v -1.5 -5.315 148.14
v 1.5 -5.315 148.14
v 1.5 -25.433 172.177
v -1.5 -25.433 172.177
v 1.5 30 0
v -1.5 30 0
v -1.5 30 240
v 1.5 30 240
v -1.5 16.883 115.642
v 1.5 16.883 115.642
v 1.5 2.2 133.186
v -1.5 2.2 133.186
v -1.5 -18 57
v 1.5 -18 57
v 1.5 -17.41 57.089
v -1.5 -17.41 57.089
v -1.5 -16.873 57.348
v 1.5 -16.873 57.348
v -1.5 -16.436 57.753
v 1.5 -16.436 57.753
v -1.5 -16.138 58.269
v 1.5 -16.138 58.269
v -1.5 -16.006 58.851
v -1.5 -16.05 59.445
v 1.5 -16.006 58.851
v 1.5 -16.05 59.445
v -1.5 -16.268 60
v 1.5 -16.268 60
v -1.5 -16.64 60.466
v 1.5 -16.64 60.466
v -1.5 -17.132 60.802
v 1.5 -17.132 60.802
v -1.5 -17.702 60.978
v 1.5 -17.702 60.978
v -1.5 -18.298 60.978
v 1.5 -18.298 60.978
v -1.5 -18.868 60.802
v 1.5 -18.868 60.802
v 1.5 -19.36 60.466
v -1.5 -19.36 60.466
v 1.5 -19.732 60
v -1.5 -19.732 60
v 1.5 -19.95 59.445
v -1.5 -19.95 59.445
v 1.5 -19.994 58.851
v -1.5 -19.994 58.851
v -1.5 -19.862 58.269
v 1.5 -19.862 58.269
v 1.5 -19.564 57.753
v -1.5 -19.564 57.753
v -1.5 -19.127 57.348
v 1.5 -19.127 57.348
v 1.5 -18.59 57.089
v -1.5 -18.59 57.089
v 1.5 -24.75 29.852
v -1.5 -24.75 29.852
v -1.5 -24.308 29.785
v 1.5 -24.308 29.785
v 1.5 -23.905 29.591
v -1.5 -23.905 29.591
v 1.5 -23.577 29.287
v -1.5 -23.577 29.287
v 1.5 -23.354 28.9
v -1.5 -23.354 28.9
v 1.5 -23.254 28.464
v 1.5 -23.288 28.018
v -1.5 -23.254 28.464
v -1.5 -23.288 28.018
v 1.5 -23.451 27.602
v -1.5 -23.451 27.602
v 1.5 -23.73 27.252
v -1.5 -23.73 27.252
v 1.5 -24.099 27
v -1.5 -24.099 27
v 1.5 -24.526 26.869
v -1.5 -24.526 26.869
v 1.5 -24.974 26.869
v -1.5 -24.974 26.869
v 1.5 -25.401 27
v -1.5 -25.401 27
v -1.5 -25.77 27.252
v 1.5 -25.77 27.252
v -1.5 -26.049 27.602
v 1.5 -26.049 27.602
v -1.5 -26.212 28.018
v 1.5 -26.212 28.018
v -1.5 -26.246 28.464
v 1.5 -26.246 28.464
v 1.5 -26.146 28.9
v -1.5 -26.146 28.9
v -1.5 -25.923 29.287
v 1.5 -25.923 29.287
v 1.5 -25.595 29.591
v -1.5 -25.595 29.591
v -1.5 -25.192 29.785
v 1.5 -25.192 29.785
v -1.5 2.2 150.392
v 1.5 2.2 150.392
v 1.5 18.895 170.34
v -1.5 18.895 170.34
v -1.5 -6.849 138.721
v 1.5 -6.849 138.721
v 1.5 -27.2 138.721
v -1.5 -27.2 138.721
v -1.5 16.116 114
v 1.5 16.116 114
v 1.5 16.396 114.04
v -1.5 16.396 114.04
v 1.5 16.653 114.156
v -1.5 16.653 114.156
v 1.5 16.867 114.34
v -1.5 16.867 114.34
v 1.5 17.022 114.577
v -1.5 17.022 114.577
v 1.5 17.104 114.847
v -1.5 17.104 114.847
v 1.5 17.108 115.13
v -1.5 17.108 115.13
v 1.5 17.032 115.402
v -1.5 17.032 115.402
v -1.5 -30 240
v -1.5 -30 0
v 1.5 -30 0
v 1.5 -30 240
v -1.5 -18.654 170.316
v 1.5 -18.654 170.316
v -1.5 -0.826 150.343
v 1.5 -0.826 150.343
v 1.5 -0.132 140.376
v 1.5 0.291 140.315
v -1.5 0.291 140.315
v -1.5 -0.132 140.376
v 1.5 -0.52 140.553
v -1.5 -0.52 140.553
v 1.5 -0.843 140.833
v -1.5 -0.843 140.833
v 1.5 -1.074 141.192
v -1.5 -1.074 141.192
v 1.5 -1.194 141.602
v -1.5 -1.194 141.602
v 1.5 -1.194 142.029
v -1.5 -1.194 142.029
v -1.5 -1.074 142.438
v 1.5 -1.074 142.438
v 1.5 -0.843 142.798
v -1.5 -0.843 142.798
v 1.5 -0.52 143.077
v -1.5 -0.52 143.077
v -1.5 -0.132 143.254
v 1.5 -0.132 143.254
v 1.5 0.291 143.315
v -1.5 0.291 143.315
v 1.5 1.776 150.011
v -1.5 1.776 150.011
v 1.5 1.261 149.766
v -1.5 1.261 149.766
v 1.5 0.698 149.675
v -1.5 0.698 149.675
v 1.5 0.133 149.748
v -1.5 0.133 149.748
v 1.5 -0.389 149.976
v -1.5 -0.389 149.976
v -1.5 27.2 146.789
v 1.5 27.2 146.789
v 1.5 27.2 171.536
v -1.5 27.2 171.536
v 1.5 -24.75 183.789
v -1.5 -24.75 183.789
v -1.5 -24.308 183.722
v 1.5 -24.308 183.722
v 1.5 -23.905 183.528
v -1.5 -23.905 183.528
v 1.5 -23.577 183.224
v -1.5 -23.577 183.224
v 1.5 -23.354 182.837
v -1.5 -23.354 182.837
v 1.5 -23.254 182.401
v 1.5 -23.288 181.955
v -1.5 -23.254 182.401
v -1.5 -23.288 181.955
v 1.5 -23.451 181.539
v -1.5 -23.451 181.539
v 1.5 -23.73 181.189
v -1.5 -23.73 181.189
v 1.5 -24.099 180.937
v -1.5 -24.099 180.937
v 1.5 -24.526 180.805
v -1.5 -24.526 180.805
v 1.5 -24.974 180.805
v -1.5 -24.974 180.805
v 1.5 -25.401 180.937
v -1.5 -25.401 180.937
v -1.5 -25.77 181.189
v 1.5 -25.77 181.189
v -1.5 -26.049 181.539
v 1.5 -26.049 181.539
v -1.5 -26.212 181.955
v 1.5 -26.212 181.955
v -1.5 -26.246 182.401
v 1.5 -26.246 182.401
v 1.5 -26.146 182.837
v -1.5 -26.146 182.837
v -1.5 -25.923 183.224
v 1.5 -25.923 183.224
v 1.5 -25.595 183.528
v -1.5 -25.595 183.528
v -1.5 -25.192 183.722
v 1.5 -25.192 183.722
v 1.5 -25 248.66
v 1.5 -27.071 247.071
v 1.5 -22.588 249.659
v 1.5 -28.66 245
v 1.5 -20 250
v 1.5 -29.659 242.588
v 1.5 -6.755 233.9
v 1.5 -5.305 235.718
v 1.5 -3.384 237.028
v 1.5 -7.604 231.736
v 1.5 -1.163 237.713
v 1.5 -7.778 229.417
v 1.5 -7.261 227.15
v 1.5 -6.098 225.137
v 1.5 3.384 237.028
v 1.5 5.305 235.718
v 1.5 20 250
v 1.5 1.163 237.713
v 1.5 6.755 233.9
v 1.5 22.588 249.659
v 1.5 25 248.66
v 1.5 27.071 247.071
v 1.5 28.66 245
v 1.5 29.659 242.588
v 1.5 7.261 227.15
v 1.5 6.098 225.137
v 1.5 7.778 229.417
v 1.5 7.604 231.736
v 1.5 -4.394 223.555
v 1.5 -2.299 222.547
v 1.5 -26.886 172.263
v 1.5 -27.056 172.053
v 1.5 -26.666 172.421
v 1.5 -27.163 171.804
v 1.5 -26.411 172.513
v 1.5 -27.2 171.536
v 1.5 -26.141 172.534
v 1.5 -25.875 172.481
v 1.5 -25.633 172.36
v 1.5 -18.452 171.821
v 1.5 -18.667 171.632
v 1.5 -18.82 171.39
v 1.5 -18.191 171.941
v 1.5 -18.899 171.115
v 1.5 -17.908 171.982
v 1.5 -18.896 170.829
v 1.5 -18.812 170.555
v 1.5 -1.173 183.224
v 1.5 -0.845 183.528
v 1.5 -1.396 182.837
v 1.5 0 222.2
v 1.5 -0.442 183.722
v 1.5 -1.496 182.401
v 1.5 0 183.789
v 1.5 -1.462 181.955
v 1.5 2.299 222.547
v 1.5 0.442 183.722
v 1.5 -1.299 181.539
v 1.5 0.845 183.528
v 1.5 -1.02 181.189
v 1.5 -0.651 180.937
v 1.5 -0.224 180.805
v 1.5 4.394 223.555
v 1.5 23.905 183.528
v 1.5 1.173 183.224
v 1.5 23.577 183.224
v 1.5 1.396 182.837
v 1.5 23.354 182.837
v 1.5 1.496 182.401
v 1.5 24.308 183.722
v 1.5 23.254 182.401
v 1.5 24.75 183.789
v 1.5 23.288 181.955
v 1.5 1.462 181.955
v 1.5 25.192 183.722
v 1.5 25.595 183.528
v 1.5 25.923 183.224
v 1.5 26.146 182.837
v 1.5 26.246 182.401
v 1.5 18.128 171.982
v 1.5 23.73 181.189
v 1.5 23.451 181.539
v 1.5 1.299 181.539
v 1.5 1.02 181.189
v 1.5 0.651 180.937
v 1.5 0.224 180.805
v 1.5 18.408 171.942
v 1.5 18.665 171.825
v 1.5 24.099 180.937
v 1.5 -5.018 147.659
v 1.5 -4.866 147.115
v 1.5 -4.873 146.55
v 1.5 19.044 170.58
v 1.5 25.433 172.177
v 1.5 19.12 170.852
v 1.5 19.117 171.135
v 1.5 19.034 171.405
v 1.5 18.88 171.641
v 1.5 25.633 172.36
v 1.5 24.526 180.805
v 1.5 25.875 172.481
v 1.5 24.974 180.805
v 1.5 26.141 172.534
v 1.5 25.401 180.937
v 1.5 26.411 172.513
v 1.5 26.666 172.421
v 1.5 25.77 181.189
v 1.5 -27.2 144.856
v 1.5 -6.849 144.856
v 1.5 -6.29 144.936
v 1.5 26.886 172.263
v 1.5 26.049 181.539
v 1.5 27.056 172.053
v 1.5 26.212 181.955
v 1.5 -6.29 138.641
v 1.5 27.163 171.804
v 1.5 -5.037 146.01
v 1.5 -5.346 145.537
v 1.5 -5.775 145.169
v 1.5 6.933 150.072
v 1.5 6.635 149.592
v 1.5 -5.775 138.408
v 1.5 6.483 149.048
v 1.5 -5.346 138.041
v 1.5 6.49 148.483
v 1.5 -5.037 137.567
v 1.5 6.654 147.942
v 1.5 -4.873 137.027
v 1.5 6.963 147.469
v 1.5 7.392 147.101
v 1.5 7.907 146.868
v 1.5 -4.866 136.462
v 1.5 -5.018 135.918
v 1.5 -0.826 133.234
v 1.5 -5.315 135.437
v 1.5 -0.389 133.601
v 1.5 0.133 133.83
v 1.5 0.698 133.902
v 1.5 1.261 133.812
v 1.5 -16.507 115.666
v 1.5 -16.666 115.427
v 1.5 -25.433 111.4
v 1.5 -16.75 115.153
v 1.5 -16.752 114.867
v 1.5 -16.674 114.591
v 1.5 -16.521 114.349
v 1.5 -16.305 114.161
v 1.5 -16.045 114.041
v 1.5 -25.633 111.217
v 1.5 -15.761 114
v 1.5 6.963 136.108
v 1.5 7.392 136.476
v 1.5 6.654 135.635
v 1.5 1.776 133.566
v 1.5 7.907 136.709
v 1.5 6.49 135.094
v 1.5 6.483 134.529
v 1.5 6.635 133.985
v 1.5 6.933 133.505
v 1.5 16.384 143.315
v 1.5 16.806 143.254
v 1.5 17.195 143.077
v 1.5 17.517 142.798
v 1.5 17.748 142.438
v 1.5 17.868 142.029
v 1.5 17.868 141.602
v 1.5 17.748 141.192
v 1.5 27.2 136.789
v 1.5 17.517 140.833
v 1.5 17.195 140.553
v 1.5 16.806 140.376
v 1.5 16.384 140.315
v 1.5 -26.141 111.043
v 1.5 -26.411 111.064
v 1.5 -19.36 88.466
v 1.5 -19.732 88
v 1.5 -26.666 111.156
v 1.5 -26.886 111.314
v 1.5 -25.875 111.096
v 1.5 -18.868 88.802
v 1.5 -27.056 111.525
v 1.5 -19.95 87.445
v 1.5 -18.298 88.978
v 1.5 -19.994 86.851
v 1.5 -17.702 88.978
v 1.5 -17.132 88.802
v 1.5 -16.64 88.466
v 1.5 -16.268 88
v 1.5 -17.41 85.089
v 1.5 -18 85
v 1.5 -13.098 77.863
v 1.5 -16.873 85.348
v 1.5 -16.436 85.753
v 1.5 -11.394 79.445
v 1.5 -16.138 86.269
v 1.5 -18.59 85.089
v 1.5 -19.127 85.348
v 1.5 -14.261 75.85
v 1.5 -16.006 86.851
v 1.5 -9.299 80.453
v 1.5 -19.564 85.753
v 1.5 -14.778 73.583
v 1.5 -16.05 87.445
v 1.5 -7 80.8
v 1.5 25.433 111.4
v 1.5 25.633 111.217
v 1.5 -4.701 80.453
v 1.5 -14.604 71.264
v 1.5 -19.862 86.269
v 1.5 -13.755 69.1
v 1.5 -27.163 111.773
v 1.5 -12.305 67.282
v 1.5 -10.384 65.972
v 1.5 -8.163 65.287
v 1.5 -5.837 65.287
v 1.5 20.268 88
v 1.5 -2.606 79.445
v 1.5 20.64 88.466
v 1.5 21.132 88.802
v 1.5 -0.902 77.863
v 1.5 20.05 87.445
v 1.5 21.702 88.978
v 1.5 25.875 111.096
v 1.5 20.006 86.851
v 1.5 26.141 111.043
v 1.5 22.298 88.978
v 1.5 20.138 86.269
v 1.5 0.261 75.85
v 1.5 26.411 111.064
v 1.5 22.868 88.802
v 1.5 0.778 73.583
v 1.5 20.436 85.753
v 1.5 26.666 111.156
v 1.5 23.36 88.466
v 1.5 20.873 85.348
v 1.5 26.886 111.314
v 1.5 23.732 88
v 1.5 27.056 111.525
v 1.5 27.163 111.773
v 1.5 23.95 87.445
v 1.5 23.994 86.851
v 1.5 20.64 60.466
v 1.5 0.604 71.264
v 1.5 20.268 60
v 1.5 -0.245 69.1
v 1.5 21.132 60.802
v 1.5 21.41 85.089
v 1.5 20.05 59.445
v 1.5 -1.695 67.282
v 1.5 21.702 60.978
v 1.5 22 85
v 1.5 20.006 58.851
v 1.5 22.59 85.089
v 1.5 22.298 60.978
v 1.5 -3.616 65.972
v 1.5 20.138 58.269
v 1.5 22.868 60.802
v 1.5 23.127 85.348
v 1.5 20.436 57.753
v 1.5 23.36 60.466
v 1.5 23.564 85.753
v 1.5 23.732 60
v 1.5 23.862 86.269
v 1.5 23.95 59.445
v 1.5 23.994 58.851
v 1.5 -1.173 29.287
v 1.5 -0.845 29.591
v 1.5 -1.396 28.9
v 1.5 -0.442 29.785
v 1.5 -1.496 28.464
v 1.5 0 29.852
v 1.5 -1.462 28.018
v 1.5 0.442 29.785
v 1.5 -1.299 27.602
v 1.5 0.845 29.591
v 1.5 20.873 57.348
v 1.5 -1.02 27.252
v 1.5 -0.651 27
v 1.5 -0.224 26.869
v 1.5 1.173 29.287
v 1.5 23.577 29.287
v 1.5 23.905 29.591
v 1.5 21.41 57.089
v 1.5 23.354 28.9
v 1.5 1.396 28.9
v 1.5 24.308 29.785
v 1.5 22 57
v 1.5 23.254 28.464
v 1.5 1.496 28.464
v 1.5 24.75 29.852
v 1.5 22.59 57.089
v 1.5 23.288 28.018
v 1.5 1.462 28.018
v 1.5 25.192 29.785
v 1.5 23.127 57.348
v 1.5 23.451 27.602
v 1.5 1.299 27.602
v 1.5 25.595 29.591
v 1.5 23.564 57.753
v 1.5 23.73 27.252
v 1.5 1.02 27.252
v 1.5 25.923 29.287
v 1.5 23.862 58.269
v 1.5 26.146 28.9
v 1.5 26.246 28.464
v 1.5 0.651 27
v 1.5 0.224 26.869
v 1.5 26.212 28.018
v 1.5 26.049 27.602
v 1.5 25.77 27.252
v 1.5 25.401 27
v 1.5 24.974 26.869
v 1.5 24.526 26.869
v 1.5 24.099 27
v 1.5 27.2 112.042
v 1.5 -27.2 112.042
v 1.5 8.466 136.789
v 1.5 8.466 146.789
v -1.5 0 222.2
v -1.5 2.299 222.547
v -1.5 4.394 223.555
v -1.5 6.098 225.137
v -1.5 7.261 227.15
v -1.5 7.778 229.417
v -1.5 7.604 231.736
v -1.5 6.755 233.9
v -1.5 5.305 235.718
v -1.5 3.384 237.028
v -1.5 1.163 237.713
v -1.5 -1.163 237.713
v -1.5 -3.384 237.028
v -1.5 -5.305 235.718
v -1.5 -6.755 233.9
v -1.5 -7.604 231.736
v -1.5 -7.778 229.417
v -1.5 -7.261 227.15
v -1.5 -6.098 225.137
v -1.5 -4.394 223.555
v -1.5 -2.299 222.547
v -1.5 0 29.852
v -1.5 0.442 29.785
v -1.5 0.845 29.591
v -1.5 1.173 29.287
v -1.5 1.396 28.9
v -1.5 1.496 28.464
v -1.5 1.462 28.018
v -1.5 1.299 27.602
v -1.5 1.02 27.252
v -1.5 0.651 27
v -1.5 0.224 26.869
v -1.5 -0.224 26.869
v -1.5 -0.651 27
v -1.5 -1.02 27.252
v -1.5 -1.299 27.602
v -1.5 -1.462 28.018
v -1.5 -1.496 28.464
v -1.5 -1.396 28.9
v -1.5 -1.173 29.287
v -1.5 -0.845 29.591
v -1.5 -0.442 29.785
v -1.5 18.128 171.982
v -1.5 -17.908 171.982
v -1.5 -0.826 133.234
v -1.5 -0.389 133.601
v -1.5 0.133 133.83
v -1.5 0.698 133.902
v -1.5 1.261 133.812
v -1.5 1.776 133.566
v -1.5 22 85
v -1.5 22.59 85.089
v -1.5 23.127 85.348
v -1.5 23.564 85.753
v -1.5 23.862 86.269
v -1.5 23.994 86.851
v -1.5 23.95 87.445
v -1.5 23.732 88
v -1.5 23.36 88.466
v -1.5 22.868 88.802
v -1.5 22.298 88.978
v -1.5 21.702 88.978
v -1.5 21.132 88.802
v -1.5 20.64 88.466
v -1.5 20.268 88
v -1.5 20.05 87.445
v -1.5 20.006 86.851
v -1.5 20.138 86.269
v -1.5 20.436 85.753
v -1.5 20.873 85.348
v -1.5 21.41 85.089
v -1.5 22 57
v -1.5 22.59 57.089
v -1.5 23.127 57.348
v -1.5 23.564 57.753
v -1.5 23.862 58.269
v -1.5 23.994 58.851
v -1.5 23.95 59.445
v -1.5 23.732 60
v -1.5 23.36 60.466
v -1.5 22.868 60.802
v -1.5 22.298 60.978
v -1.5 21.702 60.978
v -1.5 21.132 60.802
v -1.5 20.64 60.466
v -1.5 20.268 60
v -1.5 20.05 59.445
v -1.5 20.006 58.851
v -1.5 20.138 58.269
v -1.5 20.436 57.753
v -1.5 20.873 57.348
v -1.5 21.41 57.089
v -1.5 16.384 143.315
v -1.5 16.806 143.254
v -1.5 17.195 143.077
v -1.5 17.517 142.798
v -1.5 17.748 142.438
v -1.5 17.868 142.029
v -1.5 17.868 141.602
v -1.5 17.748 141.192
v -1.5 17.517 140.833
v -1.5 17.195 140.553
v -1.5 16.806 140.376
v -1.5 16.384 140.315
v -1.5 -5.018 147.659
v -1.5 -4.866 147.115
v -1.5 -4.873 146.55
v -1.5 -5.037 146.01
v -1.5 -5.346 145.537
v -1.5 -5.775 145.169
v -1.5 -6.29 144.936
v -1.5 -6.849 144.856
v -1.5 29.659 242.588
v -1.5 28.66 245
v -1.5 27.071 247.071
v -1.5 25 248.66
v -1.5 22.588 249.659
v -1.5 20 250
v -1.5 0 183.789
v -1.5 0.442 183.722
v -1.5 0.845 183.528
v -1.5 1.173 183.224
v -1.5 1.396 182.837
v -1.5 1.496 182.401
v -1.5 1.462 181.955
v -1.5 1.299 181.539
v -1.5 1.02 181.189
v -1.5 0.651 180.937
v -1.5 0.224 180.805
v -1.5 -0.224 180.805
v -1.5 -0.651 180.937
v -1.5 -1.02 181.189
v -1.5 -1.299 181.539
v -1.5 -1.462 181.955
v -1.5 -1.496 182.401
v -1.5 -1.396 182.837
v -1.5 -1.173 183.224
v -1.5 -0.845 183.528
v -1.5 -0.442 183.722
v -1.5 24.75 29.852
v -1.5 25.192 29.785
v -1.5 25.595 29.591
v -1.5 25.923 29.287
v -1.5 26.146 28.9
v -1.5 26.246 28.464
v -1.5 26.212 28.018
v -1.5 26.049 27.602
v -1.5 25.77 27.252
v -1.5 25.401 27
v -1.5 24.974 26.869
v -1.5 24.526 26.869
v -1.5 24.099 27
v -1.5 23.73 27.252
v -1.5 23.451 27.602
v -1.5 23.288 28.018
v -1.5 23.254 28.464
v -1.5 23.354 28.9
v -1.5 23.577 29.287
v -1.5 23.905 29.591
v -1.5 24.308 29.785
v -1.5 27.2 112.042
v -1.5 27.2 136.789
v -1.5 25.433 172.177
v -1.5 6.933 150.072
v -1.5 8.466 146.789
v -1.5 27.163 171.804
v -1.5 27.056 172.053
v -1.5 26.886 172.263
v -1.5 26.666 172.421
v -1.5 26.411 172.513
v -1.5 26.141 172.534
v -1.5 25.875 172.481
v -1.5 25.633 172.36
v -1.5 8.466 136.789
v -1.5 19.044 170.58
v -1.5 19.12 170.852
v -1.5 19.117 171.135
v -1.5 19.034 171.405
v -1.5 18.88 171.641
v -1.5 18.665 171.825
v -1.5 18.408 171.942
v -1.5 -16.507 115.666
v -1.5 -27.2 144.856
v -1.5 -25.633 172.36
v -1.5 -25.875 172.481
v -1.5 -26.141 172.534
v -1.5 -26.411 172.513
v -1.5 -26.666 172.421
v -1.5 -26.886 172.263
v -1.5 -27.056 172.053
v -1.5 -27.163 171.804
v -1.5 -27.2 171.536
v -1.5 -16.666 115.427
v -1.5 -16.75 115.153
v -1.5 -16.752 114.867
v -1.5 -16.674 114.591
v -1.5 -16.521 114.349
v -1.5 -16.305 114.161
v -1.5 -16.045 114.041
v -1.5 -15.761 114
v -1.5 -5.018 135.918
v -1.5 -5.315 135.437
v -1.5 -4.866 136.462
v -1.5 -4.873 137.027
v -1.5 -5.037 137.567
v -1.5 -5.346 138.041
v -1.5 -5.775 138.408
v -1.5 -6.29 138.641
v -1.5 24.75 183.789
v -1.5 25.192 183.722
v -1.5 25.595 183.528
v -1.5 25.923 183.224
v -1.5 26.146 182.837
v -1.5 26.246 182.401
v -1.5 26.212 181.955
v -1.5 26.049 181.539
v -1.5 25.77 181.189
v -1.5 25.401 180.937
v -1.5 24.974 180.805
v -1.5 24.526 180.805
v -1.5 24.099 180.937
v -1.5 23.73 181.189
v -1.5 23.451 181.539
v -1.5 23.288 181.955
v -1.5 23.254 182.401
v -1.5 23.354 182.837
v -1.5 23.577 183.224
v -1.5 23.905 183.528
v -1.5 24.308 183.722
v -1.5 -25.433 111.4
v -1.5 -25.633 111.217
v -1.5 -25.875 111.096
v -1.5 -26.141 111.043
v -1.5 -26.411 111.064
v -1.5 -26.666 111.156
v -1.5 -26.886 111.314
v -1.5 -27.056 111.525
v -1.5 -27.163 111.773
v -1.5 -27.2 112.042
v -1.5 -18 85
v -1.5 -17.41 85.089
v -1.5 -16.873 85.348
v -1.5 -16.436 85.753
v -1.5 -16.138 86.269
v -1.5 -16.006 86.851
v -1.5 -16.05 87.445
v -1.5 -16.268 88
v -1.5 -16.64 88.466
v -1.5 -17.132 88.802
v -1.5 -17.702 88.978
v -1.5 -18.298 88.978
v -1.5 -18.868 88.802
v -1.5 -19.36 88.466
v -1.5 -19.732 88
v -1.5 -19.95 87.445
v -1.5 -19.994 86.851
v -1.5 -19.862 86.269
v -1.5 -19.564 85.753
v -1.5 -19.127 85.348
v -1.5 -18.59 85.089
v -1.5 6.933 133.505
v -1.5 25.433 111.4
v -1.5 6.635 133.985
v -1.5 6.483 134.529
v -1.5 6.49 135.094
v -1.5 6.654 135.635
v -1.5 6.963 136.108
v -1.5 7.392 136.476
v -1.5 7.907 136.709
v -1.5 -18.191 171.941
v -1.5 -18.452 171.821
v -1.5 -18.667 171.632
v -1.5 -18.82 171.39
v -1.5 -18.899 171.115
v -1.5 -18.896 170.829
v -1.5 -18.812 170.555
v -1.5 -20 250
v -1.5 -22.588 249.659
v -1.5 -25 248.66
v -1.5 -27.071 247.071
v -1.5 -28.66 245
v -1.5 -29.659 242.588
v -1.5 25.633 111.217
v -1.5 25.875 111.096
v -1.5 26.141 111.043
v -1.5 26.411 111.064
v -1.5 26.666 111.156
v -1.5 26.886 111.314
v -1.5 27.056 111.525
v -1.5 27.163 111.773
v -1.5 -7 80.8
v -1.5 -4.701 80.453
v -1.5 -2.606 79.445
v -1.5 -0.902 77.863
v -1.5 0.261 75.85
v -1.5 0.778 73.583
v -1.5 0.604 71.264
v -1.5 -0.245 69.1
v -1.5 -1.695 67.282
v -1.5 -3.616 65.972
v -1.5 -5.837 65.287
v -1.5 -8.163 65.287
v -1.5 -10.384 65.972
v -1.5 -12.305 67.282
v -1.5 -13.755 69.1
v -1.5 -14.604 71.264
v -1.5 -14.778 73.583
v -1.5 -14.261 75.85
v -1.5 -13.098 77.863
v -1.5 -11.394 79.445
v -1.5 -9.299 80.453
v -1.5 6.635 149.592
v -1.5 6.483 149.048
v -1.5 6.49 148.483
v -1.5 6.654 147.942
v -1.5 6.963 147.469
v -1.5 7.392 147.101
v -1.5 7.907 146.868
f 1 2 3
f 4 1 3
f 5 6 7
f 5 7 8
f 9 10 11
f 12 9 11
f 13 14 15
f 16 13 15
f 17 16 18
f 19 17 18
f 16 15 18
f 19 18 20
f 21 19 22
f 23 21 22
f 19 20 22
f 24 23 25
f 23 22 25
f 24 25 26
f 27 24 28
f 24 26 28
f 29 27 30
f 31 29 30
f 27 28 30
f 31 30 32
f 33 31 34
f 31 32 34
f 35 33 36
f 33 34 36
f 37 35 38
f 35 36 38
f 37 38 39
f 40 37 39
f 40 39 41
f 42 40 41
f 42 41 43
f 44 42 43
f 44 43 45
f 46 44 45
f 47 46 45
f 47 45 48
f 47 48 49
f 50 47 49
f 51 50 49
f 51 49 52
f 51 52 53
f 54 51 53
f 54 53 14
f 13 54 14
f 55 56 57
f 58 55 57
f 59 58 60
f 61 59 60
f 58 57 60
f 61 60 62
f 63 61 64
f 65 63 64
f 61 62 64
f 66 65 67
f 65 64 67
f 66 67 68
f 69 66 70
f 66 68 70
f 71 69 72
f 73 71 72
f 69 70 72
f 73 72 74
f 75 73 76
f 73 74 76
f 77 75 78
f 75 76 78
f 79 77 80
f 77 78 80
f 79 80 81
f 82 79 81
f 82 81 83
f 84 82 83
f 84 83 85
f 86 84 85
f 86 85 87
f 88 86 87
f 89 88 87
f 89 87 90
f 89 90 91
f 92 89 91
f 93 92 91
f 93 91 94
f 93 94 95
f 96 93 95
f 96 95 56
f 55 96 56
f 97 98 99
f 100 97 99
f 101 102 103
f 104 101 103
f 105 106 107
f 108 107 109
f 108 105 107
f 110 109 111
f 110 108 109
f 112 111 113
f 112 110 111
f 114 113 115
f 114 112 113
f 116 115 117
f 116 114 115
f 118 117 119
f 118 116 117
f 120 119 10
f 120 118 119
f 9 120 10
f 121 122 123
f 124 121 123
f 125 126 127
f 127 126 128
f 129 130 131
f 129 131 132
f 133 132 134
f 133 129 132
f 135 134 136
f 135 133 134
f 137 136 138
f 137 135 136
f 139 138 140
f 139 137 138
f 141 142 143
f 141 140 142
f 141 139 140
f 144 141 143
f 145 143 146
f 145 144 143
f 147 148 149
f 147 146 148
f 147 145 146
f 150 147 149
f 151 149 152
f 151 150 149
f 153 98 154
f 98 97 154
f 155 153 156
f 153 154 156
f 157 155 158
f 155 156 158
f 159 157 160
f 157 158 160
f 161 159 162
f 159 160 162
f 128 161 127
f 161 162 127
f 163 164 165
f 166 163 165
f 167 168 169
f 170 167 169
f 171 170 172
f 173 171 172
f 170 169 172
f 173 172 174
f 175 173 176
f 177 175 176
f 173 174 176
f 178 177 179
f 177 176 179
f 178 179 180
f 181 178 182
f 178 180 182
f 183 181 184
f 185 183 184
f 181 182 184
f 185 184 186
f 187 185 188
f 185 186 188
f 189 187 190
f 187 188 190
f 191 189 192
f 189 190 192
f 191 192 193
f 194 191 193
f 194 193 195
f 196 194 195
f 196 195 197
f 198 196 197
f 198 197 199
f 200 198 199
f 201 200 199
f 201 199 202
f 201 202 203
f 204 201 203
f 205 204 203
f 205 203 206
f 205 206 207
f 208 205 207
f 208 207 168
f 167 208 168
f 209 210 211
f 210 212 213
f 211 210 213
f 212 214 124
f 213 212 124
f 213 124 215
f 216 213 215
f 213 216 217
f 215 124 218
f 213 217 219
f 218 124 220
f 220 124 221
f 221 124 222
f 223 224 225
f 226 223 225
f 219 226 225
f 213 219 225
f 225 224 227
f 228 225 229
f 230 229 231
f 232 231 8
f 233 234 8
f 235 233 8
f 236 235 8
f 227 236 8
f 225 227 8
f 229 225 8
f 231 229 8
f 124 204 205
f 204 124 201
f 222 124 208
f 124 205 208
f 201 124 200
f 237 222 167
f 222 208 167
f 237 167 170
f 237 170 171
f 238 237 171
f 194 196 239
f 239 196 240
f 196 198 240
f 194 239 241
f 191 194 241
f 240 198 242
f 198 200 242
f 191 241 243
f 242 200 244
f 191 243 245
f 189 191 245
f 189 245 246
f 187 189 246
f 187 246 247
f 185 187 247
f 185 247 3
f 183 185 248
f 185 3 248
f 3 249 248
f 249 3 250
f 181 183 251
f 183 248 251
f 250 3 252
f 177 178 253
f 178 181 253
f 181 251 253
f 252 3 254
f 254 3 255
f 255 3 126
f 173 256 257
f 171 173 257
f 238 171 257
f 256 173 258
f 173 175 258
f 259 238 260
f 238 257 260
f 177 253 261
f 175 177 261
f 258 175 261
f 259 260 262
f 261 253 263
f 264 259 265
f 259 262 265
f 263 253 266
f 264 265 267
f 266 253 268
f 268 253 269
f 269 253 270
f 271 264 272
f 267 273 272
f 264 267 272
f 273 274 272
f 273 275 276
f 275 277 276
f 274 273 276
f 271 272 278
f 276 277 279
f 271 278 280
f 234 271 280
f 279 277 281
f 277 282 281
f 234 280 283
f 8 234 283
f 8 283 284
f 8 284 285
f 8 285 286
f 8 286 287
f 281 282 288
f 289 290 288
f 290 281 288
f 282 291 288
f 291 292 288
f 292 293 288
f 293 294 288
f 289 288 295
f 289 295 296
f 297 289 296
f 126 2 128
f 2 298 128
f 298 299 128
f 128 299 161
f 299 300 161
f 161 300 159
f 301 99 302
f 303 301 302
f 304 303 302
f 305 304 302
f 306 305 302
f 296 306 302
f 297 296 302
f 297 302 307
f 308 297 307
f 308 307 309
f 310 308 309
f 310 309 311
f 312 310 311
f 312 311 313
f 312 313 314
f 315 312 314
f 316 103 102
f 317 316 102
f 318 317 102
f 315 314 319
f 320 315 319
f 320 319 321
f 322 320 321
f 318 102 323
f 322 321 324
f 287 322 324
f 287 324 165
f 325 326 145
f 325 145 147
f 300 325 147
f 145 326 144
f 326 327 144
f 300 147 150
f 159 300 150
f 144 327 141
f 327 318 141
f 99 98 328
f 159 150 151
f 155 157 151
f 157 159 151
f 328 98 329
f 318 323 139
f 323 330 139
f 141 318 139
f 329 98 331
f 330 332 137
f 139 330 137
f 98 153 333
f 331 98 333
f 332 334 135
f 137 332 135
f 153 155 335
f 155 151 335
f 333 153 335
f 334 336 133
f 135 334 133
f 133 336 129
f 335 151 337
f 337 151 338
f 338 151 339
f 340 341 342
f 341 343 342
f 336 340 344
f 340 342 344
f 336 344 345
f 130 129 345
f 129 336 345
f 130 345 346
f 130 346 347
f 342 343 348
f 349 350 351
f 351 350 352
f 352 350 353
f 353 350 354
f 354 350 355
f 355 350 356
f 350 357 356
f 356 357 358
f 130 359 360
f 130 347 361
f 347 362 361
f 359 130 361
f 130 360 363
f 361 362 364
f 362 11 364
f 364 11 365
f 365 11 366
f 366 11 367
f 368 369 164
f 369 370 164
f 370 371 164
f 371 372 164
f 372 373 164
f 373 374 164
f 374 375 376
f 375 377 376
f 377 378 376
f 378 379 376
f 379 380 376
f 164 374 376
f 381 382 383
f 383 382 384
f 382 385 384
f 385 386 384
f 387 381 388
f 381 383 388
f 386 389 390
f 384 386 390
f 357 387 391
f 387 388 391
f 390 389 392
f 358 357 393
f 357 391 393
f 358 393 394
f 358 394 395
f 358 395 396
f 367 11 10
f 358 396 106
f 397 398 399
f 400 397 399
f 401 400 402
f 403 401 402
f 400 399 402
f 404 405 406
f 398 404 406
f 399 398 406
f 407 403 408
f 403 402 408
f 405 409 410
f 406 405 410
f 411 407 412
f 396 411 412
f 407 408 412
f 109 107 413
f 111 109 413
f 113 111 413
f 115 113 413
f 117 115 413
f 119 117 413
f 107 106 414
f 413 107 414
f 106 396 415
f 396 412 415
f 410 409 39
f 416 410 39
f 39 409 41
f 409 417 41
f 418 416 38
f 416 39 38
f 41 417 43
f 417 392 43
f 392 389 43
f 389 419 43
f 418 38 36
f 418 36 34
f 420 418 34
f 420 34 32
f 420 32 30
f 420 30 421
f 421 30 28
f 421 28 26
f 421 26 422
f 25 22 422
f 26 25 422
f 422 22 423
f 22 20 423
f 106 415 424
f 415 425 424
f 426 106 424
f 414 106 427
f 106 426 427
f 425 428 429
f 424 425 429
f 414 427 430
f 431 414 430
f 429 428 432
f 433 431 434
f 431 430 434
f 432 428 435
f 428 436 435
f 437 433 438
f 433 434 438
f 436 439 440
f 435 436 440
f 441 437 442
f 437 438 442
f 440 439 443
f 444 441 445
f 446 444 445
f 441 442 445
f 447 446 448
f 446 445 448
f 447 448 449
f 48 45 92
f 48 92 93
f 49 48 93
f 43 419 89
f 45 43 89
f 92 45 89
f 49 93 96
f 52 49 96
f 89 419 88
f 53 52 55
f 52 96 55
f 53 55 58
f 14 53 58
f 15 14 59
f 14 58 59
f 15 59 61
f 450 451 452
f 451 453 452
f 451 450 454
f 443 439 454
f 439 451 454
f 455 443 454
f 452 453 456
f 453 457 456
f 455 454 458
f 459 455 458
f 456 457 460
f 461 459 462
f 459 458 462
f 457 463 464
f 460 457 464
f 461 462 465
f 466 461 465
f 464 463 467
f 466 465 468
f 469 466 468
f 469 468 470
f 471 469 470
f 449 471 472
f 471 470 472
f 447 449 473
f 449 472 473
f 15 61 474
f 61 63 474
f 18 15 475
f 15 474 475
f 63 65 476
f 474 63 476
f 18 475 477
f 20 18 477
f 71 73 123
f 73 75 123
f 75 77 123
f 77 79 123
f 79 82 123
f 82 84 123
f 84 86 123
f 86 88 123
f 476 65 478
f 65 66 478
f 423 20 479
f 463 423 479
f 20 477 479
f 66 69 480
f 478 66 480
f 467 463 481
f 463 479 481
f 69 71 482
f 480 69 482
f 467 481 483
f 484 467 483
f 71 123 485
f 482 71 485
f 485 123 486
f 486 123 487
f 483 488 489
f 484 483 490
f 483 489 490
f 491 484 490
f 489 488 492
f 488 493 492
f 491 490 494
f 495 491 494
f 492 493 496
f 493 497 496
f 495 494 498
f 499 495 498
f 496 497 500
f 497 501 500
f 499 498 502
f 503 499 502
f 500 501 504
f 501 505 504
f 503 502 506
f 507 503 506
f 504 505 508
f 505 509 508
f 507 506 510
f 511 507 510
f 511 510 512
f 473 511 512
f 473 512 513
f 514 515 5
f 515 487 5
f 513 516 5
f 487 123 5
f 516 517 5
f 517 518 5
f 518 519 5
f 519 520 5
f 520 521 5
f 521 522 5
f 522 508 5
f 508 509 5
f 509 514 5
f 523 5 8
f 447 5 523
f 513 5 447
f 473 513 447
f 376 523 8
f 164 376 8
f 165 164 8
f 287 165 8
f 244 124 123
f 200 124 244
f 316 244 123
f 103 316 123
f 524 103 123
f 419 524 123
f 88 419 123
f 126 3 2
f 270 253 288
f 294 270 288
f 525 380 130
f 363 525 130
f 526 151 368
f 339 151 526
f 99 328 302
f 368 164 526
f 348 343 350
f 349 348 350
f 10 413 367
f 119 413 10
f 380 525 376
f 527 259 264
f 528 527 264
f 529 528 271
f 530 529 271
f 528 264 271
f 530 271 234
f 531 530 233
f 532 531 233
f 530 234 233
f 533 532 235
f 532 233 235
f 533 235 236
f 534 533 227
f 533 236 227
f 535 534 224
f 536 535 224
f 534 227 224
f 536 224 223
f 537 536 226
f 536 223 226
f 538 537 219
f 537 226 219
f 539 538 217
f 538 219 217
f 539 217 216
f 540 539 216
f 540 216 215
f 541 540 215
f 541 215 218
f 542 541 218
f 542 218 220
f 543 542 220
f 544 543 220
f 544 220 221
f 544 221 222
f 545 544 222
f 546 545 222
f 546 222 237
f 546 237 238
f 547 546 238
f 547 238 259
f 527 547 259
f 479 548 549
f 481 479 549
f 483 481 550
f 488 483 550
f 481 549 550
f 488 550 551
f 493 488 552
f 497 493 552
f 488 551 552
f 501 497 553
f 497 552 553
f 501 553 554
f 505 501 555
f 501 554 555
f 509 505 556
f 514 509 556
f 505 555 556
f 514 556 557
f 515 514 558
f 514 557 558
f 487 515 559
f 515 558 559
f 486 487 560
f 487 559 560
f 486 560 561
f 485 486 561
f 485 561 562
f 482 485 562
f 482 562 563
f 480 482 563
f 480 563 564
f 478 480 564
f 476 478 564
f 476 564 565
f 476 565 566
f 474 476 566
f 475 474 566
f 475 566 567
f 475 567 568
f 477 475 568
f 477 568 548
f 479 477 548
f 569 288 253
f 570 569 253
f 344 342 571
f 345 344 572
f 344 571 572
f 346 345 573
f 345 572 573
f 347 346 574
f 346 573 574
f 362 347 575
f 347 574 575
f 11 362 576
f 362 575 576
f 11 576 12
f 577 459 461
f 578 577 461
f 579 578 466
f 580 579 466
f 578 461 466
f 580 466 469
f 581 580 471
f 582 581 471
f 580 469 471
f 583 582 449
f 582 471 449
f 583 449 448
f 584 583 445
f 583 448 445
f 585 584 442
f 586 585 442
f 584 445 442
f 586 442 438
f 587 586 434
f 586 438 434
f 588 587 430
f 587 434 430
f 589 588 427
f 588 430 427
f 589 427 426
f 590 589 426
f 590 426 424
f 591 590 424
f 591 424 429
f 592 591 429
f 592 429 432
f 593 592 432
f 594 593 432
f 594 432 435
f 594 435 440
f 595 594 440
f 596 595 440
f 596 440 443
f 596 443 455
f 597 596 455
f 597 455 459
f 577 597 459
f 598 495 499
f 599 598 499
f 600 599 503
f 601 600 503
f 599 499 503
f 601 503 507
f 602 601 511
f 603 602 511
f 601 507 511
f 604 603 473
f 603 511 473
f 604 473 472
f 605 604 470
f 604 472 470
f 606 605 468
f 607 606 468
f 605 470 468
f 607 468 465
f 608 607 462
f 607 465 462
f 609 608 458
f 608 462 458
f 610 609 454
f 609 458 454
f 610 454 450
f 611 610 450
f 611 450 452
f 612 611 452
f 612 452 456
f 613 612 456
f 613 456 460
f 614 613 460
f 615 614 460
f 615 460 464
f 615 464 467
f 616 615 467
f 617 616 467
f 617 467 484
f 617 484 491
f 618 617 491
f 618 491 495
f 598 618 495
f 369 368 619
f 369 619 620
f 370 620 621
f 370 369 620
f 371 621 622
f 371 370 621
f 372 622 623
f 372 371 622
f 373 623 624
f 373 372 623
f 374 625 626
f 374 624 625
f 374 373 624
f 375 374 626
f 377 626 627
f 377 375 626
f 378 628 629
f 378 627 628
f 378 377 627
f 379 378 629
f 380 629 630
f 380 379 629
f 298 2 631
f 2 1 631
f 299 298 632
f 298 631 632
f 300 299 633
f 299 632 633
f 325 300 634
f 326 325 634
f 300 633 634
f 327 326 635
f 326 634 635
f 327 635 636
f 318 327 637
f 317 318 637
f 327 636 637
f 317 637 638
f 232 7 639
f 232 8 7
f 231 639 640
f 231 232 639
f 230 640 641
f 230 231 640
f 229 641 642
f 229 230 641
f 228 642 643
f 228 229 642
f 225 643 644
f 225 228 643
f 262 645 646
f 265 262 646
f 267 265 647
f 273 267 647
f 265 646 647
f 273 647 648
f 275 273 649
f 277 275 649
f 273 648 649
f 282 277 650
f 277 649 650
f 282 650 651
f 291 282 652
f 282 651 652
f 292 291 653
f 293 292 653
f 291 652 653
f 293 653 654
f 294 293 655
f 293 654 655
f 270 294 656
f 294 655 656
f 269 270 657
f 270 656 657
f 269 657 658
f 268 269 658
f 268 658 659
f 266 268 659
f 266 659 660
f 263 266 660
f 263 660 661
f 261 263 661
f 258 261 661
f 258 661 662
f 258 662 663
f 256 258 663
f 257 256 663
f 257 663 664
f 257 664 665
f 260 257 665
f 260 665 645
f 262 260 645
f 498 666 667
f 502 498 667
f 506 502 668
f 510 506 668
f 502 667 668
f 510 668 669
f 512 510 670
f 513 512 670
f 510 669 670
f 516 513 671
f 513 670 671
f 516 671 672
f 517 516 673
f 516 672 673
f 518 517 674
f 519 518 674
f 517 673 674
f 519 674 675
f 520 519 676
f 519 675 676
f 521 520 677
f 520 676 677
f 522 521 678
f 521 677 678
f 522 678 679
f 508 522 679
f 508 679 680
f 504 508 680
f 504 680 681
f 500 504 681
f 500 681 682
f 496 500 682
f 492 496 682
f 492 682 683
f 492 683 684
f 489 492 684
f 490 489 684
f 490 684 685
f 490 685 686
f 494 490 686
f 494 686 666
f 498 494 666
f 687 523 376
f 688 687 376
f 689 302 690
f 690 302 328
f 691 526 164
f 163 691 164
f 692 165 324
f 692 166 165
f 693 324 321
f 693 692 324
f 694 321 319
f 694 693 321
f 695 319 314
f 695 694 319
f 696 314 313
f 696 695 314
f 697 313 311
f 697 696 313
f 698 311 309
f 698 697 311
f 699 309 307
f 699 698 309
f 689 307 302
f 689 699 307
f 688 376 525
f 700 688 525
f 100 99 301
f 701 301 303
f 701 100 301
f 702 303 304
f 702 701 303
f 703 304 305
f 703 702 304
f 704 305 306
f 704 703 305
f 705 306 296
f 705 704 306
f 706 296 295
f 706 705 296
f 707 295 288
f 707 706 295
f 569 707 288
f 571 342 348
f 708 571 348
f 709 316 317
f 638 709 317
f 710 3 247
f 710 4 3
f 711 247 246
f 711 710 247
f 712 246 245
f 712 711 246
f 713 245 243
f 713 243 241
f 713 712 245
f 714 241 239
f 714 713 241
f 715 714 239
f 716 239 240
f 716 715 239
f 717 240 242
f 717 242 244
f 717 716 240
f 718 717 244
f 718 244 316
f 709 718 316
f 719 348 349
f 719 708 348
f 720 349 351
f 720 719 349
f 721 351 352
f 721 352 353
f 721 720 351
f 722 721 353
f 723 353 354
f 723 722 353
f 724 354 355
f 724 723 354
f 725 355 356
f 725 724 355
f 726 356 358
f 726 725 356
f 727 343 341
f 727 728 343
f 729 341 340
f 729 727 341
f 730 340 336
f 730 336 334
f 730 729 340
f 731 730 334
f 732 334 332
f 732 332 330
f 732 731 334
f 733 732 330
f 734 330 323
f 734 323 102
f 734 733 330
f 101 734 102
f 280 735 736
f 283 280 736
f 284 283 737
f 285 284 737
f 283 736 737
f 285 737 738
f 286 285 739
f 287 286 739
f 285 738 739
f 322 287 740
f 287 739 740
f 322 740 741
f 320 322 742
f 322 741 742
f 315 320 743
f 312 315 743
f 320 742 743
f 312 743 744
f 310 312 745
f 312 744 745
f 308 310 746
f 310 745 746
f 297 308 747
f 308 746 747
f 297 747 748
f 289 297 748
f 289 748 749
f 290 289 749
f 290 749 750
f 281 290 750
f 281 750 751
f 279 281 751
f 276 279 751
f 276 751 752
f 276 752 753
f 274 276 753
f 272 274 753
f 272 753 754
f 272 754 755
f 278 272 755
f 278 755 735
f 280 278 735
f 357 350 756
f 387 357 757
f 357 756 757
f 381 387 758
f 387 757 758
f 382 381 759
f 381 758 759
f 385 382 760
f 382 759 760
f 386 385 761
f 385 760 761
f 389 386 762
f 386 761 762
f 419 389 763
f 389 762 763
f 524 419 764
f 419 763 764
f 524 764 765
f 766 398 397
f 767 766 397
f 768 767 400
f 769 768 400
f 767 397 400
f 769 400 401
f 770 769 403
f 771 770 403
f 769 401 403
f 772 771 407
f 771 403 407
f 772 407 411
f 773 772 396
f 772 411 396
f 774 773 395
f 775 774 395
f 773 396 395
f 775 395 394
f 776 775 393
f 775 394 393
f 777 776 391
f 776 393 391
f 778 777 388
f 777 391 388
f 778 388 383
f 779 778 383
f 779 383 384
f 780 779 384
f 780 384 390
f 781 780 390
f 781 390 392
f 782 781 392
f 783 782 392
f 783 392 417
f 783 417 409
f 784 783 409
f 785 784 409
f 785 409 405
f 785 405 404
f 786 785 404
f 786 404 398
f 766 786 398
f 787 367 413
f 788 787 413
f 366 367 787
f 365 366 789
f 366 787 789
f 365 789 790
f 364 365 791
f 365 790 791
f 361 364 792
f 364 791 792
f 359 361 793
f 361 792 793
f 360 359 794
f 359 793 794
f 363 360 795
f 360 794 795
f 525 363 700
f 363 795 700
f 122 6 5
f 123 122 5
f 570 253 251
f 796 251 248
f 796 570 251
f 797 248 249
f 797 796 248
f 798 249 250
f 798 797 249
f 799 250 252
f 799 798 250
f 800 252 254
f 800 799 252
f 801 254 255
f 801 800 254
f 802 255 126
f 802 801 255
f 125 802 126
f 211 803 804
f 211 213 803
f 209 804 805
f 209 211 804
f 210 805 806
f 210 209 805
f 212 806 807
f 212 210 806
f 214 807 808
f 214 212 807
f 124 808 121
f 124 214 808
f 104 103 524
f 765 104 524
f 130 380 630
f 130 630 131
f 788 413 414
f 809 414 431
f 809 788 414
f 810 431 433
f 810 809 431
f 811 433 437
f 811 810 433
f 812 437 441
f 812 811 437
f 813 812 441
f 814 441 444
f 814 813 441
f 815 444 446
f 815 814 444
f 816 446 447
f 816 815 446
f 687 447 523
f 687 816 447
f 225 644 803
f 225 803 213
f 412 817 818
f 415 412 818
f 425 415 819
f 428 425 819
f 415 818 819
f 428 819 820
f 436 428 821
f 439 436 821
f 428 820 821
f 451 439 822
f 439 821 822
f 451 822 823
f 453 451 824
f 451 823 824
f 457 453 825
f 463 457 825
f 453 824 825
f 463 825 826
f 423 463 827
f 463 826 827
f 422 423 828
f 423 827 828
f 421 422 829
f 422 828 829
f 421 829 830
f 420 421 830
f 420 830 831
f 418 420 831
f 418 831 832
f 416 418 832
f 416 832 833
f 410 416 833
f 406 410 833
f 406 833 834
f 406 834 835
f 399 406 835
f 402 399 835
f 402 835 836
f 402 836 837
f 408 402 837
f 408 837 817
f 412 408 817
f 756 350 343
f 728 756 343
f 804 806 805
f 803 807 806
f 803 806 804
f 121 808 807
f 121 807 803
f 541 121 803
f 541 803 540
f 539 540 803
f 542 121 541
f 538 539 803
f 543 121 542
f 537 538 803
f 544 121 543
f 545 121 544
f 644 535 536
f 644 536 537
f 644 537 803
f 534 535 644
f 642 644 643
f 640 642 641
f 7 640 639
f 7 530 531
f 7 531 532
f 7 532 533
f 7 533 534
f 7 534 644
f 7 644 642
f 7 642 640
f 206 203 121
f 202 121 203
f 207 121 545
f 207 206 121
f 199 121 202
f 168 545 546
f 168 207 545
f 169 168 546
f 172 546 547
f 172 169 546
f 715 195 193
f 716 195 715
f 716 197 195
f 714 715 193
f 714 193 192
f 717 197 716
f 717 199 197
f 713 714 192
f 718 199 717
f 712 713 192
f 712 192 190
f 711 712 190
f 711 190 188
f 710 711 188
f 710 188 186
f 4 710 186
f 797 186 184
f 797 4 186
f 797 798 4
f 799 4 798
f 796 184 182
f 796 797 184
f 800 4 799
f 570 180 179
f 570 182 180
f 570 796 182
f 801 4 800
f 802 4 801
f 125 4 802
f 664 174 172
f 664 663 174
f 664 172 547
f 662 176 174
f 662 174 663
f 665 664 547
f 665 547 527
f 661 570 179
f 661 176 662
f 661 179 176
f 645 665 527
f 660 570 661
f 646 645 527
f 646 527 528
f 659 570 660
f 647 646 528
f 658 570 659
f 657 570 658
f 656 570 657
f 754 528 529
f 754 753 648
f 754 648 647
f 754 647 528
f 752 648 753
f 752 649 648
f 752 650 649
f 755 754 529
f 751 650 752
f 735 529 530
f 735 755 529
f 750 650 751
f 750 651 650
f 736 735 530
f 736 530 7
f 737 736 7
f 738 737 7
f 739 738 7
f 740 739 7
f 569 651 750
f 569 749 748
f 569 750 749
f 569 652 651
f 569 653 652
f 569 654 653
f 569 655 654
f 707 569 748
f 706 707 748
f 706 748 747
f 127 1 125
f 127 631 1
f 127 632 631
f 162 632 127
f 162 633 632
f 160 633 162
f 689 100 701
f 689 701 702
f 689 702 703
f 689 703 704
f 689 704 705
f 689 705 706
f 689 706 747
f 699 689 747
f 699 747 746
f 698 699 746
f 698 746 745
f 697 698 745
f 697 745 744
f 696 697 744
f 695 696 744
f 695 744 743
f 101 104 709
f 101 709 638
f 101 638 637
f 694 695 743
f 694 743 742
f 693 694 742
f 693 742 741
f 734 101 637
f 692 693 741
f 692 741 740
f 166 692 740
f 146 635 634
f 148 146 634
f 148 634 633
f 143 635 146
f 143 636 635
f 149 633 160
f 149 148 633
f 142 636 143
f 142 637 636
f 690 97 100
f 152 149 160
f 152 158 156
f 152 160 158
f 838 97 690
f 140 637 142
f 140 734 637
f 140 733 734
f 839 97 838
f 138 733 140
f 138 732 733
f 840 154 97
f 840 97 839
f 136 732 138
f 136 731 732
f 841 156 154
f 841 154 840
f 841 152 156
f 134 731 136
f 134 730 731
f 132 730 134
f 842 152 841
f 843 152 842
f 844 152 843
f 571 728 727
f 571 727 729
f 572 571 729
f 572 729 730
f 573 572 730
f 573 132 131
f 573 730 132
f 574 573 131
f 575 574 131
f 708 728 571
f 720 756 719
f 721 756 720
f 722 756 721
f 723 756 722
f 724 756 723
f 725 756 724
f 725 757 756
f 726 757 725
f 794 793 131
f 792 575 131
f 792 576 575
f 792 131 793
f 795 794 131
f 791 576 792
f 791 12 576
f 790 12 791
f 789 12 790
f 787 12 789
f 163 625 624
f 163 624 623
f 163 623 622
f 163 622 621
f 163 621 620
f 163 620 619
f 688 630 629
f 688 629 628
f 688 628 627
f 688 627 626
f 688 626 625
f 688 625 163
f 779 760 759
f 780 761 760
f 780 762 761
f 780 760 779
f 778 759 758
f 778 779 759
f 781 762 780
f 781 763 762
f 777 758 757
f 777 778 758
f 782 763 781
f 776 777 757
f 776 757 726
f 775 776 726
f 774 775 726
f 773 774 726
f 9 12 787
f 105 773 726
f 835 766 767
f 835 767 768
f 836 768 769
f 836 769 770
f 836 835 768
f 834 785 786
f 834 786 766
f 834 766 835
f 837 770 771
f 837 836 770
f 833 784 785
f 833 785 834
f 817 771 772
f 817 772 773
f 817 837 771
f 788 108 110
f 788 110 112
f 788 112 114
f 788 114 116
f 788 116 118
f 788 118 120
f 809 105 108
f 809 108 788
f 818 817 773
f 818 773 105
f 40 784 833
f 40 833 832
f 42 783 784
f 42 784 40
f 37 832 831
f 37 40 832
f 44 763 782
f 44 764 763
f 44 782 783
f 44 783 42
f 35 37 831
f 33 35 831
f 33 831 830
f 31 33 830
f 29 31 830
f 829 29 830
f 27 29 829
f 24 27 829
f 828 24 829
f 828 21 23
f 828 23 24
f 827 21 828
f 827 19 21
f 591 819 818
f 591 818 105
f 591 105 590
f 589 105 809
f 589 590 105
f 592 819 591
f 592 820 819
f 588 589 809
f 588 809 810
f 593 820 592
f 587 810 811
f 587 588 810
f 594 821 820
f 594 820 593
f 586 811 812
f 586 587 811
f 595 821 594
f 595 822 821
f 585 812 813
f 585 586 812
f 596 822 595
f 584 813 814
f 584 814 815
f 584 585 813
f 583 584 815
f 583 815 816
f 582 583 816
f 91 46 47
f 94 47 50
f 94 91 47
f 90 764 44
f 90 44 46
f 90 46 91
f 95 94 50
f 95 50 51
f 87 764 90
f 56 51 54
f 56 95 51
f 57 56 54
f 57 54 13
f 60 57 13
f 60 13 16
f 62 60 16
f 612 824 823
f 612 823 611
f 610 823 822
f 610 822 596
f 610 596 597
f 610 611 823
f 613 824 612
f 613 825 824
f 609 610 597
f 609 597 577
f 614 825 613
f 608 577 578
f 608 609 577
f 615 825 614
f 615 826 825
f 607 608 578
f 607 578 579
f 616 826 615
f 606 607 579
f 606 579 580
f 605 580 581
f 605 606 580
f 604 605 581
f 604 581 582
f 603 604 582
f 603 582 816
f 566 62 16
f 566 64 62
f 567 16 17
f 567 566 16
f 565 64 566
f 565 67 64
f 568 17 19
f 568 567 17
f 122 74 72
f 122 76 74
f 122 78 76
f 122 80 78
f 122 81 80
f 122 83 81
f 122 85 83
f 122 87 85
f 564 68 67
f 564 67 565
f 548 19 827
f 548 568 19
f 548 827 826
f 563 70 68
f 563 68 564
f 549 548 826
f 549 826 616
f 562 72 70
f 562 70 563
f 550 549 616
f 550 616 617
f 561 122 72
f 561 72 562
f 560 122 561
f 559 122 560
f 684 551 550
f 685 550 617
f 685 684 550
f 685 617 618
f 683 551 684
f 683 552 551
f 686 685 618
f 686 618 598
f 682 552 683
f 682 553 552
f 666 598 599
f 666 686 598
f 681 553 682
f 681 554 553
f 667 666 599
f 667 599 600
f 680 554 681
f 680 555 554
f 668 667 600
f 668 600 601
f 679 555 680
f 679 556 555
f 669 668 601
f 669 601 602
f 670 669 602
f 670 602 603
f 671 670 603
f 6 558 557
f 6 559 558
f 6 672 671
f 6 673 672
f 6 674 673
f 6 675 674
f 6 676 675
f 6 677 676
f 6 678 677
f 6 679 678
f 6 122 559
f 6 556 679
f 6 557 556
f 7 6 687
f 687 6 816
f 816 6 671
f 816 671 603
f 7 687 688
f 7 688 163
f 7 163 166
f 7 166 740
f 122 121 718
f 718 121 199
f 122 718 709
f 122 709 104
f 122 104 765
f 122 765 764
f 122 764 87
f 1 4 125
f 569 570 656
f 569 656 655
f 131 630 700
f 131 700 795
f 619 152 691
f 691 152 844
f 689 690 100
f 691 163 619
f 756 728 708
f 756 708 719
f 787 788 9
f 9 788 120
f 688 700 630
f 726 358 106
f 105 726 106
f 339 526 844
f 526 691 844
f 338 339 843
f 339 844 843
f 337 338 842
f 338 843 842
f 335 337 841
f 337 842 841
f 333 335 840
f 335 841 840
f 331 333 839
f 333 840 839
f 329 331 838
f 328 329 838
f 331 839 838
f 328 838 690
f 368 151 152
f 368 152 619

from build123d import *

# Parameters (mm, degrees)
SKETCH1_W           = 3
SKETCH1_H           = 60
BOSS_EXTRUDE1_DEPTH = 250
FILLET1_R           = 10
FILLET2_R           = 10
SKETCH2_R           = 4.25
CUT_EXTRUDE1_DEPTH  = 4
SKETCH9_R           = 7.8
CUT_EXTRUDE7_DEPTH  = 4
SKETCH11_R          = 7.8
CUT_EXTRUDE8_DEPTH  = 4
SKETCH13_R          = 2
CUT_EXTRUDE9_DEPTH  = 4
CUT_EXTRUDE13_DEPTH = 10
FILLET3_R           = 2
FILLET4_R           = 1
SKETCH18_R          = 1.5
SKETCH18_R_2        = 1.499999992
CUT_EXTRUDE15_DEPTH = 4
CUT_EXTRUDE16_DEPTH = 4


with BuildPart() as part:
    # Sketch1 → Boss-Extrude1 (new body)
    with BuildSketch(Plane.XY):
        Rectangle(SKETCH1_W, SKETCH1_H)
    extrude(amount=BOSS_EXTRUDE1_DEPTH)

    # Fillet1
    fillet1_edges = [part.edges().sort_by_distance(p)[0] for p in [
        (0, 30, 250),
    ]]
    fillet(fillet1_edges, radius=FILLET1_R)

    # Fillet2
    fillet2_edges = [part.edges().sort_by_distance(p)[0] for p in [
        (0, -30, 250),
    ]]
    fillet(fillet2_edges, radius=FILLET2_R)

    # Sketch2 → Cut-Extrude1 (cut, through all)
    with BuildSketch(Plane.ZY.offset(1.5)):
        with Locations((230, 0)):
            Circle(SKETCH2_R)
    extrude(amount=-CUT_EXTRUDE1_DEPTH, mode=Mode.SUBTRACT)

    # Sketch9 → Cut-Extrude7 (cut, through all)
    with BuildSketch(Plane(origin=(1.5, 0, 0), x_dir=(0, 0, -1), z_dir=(1, 0, 0))):
        with Locations((-230, 0)):
            Circle(SKETCH9_R)
    extrude(amount=-CUT_EXTRUDE7_DEPTH, mode=Mode.SUBTRACT)

    # Sketch11 → Cut-Extrude8 (cut, through all)
    with BuildSketch(Plane.ZY.offset(1.5)):
        with Locations((73, -7)):
            Circle(SKETCH11_R)
    extrude(amount=-CUT_EXTRUDE8_DEPTH, mode=Mode.SUBTRACT)

    # Sketch13 → Cut-Extrude9 (cut, through all)
    with BuildSketch(Plane(origin=(1.5, 0, 0), x_dir=(0, 0, -1), z_dir=(1, 0, 0))):
        with Locations((-87, 22)):
            Circle(SKETCH13_R)
        with Locations((-59, 22)):
            Circle(SKETCH13_R)
        with Locations((-59, -18)):
            Circle(SKETCH13_R)
        with Locations((-87, -18)):
            Circle(SKETCH13_R)
    extrude(amount=-CUT_EXTRUDE9_DEPTH, mode=Mode.SUBTRACT)

    # Sketch16 → Cut-Extrude13 (cut)
    with BuildSketch(Plane(origin=(1.5, 0, 0), x_dir=(0, 0, -1), z_dir=(1, 0, 0))):
        Polygon((-146.788564399, 27.2), (-174.288564399, 27.2), (-146.788564399, 4.184615385), align=None)
        Polygon((-109.288564399, 27.2), (-136.788564399, 27.2), (-136.788564399, 4.184615385), align=None)
        Polygon((-114, -17.994443239), (-114, 18.25689082), (-134.959973954, 0.715004926), align=None)
        Polygon((-148.617154843, 0.715004926), (-171.981755255, 20.269378193), (-171.981755255, -20.140878829), align=None)
        Polygon((-109.288564399, -27.2), (-138.721101597, -2.567230406), (-138.721101597, -27.2), align=None)
        Polygon((-144.856027201, -2.567230406), (-174.288564399, -27.2), (-144.856027201, -27.2), align=None)
    extrude(amount=-CUT_EXTRUDE13_DEPTH, mode=Mode.SUBTRACT)

    # Fillet3
    fillet3_edges = [part.edges().sort_by_distance(p)[0] for p in [
        (0, 0.715004926, 134.959973954),
        (0, -2.567230406, 144.856027201),
        (0, 4.184615385, 146.788564399),
        (0, -2.567230406, 138.721101597),
        (0, 0.715004926, 148.617154843),
        (0, 4.184615385, 136.788564399),
    ]]
    fillet(fillet3_edges, radius=FILLET3_R)

    # Fillet4
    fillet4_edges = [part.edges().sort_by_distance(p)[0] for p in [
        (0, 18.25689082, 114),
        (0, -17.994443239, 114),
        (0, -27.2, 174.288564399),
        (0, 27.2, 174.288564399),
        (0, -27.2, 109.288564399),
        (0, 20.269378193, 171.981755255),
        (0, -20.140878829, 171.981755255),
        (0, 27.2, 109.288564399),
    ]]
    fillet(fillet4_edges, radius=FILLET4_R)

    # Sketch18 → Cut-Extrude15 (cut, through all)
    with BuildSketch(Plane.ZY.offset(1.5)):
        with Locations((182.288564399, 24.750000007)):
            Circle(SKETCH18_R)
        with Locations((182.288564399, 7e-09)):
            Circle(SKETCH18_R)
        with Locations((182.288564399, -24.749999993)):
            Circle(SKETCH18_R)
        with Locations((28.351822221, 24.750000005)):
            Circle(SKETCH18_R_2)
        with Locations((28.351822214, 0)):
            Circle(SKETCH18_R)
        with Locations((28.351822221, -24.749999995)):
            Circle(SKETCH18_R_2)
    extrude(amount=-CUT_EXTRUDE15_DEPTH, mode=Mode.SUBTRACT)

    # Sketch22 → Cut-Extrude16 (cut, through all)
    with BuildSketch(Plane(origin=(1.5, 0, 0), x_dir=(0, 0, -1), z_dir=(1, 0, 0))):
        with BuildLine():
            Line((-140.3152575, 16.383557477), (-140.3152575, 0.290513908))
            ThreePointArc((-140.3152575, 0.290513908), (-141.8152575, -1.209486092), (-143.3152575, 0.290513908))
            Line((-143.3152575, 0.290513908), (-143.3152575, 16.383557477))
            ThreePointArc((-143.3152575, 16.383557477), (-141.8152575, 17.883557477), (-140.3152575, 16.383557477))
        make_face()
    extrude(amount=-CUT_EXTRUDE16_DEPTH, mode=Mode.SUBTRACT)


solid = part.part
